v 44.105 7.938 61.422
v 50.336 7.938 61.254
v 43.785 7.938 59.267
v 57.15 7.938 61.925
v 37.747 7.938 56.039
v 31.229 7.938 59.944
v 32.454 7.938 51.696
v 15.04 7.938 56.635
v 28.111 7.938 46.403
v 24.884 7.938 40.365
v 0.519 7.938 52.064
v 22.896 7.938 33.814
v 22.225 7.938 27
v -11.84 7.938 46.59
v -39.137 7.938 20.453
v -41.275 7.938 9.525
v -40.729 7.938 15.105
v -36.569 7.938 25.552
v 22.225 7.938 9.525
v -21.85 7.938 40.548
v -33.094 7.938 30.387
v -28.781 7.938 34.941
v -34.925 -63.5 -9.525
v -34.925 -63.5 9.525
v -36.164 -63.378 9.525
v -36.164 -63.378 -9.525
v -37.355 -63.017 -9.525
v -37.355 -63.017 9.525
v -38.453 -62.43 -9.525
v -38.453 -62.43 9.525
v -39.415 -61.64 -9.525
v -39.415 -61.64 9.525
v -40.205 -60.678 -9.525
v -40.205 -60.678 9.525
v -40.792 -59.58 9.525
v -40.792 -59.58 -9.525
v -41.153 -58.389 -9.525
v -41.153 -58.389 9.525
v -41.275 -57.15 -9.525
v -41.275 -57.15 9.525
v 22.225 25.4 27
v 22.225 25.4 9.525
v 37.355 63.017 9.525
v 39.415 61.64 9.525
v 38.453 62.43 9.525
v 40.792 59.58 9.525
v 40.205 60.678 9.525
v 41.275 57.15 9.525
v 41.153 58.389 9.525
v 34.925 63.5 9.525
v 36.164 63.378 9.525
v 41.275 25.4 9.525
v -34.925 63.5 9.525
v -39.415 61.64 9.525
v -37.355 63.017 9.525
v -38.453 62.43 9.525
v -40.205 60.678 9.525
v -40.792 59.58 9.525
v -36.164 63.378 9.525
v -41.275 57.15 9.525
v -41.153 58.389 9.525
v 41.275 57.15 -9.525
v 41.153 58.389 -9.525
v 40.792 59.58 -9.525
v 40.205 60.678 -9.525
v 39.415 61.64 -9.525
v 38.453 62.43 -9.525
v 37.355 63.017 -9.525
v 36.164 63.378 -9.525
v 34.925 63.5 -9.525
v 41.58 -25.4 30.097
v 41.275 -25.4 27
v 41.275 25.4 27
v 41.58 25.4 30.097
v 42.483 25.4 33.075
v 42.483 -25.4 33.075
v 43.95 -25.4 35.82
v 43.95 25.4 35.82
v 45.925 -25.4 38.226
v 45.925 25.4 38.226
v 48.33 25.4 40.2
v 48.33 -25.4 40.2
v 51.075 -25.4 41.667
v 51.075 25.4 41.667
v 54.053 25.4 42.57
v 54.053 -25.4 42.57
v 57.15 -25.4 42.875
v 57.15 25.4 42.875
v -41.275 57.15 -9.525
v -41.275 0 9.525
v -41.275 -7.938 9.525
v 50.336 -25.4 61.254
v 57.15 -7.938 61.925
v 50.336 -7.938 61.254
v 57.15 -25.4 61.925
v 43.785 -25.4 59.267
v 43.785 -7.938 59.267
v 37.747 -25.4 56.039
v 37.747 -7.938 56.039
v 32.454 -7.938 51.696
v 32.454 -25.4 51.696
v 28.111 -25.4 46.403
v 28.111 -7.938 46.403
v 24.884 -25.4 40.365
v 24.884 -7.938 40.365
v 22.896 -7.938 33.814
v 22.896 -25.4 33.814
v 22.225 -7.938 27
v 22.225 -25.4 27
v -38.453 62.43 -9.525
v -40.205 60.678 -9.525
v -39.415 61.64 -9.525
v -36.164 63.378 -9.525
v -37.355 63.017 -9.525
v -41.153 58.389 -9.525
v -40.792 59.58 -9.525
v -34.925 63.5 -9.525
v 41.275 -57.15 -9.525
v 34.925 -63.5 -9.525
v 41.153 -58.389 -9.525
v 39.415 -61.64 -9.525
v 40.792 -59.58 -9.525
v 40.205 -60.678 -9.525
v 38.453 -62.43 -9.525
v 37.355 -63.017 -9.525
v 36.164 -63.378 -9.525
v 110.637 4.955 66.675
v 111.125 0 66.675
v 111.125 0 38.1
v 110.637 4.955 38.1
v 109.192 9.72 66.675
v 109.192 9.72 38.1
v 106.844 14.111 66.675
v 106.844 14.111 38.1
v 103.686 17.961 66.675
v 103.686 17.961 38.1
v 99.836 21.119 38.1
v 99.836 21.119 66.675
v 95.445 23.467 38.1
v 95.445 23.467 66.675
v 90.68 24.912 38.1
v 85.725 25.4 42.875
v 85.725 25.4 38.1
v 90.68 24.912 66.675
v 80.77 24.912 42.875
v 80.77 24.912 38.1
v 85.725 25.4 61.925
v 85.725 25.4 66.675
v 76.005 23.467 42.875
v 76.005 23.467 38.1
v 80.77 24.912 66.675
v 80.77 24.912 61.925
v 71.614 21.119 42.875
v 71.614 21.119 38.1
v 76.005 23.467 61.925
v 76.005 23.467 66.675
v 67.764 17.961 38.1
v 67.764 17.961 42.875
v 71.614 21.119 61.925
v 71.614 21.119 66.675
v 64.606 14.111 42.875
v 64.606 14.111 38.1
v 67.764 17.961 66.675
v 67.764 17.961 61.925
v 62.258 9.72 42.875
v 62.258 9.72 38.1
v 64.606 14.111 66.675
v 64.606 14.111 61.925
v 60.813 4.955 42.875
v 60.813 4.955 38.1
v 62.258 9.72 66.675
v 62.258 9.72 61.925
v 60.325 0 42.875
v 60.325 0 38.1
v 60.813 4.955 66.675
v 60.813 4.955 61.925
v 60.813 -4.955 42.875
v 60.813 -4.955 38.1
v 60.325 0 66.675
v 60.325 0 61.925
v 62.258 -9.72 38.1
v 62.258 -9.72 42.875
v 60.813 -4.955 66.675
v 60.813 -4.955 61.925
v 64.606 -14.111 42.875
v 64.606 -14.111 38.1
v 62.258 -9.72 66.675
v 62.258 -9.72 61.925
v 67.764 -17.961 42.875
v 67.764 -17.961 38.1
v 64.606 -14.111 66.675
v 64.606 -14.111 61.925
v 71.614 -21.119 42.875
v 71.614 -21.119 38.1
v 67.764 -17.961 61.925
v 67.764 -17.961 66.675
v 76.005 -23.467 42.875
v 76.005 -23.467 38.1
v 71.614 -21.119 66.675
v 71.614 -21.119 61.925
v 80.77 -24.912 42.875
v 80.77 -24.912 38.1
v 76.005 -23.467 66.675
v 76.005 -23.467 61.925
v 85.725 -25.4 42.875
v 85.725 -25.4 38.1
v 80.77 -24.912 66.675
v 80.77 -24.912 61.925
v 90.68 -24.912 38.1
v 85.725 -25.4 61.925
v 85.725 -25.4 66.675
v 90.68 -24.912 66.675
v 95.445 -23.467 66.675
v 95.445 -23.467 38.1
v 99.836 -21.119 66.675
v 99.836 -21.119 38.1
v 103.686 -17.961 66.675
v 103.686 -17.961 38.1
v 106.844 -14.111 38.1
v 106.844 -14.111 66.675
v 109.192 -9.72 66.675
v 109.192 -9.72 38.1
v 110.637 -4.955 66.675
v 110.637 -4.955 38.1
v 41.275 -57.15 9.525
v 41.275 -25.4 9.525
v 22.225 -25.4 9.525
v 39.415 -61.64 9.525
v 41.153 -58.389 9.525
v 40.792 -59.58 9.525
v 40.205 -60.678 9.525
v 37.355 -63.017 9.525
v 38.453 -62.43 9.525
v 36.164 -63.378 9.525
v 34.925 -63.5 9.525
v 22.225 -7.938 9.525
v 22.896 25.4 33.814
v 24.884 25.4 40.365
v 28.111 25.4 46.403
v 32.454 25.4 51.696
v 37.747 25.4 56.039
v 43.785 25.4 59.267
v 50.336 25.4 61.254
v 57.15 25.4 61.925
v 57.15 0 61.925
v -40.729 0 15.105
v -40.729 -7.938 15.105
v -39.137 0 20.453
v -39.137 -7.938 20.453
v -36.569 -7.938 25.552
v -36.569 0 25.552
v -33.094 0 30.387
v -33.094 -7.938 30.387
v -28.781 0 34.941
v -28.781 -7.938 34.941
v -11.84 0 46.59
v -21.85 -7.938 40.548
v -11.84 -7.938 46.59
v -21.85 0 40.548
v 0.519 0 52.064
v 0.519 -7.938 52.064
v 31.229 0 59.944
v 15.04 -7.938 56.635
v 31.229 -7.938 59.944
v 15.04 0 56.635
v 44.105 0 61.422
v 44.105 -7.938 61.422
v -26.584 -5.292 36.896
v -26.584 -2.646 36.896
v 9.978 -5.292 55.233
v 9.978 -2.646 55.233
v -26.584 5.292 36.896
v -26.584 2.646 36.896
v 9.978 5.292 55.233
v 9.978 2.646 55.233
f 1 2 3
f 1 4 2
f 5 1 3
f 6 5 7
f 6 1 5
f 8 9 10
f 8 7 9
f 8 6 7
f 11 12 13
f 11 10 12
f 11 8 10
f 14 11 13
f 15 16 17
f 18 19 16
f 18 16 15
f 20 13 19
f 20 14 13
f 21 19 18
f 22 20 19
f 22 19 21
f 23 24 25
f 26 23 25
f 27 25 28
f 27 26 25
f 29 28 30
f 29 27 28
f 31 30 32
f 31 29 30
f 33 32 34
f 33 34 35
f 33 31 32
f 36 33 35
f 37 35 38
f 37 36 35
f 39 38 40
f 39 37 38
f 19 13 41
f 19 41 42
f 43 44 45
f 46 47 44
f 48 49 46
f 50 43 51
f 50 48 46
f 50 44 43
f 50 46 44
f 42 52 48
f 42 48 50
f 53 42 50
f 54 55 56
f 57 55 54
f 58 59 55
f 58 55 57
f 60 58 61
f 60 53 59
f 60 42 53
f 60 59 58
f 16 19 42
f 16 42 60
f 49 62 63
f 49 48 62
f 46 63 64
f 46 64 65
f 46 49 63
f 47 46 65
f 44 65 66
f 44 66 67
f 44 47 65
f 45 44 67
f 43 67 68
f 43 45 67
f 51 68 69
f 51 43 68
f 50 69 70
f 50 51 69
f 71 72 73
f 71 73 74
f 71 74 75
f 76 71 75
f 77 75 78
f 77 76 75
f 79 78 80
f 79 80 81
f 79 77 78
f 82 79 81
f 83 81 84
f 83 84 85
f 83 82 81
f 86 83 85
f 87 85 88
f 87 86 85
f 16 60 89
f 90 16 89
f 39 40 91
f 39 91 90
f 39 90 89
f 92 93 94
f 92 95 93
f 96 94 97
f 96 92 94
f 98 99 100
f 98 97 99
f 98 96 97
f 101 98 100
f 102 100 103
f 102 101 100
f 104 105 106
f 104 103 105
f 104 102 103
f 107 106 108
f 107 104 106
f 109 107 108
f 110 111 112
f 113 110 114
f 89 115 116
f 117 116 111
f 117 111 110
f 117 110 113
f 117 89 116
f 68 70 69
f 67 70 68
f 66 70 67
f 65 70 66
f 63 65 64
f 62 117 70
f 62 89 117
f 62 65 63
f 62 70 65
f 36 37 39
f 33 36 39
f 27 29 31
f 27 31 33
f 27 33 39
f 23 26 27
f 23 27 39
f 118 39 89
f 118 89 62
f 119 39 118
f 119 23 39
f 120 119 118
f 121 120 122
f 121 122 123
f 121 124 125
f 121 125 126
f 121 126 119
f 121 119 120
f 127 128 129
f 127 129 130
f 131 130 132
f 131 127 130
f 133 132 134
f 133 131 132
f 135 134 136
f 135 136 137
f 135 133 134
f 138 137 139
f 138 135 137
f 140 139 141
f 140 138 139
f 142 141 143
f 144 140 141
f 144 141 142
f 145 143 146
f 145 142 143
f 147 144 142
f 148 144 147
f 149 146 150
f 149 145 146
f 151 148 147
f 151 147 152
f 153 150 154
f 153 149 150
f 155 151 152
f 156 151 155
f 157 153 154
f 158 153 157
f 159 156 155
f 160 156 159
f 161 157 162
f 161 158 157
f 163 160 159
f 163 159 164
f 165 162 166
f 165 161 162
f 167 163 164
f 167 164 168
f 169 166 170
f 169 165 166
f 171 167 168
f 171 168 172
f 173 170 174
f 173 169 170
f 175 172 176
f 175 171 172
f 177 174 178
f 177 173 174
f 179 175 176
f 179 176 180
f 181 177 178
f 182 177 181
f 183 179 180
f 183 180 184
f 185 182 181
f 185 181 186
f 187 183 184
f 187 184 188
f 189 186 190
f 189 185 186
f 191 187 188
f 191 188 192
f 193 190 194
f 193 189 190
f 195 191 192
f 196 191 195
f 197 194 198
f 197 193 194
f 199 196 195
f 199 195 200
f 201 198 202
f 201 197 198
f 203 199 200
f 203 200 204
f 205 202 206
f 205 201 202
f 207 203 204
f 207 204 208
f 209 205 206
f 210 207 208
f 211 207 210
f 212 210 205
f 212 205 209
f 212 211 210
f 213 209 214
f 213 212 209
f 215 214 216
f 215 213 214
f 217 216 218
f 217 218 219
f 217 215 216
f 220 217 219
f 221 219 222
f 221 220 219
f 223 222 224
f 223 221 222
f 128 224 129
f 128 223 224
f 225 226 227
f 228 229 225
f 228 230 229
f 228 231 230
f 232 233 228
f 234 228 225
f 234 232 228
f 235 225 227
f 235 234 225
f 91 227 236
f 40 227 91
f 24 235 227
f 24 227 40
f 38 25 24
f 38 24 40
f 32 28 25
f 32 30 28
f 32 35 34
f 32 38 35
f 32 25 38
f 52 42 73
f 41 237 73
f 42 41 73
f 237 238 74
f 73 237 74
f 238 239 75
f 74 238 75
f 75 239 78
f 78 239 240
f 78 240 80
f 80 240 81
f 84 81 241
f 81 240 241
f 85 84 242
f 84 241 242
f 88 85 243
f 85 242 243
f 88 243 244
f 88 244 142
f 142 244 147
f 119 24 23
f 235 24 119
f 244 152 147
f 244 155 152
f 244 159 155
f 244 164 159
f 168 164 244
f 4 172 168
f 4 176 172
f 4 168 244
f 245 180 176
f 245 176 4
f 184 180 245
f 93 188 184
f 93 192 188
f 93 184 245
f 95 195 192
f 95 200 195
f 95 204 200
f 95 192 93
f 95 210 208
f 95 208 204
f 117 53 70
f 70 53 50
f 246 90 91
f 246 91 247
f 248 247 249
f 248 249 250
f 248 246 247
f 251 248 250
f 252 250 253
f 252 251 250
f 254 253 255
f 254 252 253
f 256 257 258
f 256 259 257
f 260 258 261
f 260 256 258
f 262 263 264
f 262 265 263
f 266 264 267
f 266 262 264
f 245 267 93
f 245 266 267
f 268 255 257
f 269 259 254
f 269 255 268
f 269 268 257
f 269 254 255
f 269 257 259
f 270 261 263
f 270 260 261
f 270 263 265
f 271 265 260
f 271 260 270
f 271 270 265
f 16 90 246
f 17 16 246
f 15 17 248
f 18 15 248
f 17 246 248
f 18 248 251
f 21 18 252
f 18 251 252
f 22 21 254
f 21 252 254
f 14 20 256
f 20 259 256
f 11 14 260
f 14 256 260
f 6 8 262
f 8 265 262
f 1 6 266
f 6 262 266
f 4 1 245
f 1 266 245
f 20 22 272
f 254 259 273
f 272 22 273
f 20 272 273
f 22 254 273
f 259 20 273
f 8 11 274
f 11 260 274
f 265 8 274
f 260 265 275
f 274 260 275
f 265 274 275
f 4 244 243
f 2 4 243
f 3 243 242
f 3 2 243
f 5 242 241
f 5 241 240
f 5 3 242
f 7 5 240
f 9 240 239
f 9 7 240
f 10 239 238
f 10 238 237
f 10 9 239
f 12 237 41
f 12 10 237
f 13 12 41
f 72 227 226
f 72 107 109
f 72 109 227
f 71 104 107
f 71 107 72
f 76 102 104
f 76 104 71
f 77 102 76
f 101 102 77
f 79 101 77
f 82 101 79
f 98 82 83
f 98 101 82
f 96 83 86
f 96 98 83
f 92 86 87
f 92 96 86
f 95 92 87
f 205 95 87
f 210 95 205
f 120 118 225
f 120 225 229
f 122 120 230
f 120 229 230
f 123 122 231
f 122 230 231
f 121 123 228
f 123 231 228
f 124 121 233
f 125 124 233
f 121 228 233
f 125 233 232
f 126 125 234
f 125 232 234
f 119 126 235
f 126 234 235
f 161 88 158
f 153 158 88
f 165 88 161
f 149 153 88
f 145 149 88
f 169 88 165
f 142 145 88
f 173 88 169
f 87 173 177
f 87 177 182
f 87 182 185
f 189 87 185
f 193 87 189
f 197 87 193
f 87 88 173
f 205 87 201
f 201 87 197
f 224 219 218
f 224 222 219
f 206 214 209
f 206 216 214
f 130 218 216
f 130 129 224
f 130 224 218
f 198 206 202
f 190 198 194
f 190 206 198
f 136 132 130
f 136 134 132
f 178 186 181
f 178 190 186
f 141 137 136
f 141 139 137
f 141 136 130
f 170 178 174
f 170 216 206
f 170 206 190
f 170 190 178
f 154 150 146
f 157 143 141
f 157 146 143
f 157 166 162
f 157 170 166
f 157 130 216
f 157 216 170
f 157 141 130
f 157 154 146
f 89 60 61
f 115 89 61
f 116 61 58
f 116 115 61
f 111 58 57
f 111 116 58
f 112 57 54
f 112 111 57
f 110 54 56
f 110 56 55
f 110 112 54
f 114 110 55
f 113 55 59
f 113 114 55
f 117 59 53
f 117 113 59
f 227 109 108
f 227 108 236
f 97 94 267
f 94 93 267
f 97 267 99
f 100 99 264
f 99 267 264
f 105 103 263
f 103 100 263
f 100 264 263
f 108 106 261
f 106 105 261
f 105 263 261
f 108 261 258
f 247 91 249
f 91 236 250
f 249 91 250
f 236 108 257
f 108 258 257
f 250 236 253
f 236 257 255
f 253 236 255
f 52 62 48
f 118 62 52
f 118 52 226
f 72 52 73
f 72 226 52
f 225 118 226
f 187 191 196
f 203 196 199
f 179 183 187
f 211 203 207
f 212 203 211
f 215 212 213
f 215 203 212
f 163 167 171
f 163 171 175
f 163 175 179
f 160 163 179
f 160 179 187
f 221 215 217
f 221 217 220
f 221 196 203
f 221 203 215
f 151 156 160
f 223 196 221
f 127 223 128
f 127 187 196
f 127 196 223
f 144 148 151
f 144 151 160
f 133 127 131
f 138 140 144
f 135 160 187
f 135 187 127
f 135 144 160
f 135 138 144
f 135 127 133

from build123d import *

# Parameters (mm, degrees)
F1_DEPTH = 63.5
F0_W     = 25.4
F0_H     = 19.05
F2_DEPTH = 25.4
F3_DEPTH = 7.9375
F5_R     = 6.35


# Not quite as in the source:
# - a feature names something its author has since deleted; it is built from what else it names


with BuildPart() as f1:
    # F0 (on Front) → F1 (new body, symmetric)
    with BuildSketch(Plane.XZ):
        Polygon((-41.275, 9.525), (-41.275, -9.525), (41.275, -9.525), (41.275, 9.525), (22.225, 9.525), align=None)
    extrude(amount=F1_DEPTH, both=True)

    # F0 (on Front) → F2 (join, symmetric)
    with BuildSketch(Plane.XZ):
        with BuildLine():
            Line((22.225, 9.525), (41.275, 9.525))
            Line((41.275, 9.525), (41.275, 27.0002))
            ThreePointArc((41.275, 27.0002), (45.9246798487, 38.2255201513), (57.15, 42.8752))
            Line((57.15, 42.8752), (60.325, 42.8752))
            Line((60.325, 42.8752), (60.325, 61.9252))
            Line((60.325, 61.9252), (57.15, 61.9252))
            ThreePointArc((57.15, 61.9252), (32.4542956671, 51.6959043329), (22.225, 27.0002))
            Line((22.225, 27.0002), (22.225, 9.525))
        make_face()
        with Locations((73.025, 52.4002)):
            Rectangle(F0_W, F0_H)
    extrude(amount=F2_DEPTH, both=True)

    # F0 (on Front) → F3 (join, symmetric)
    with BuildSketch(Plane.XZ):
        with BuildLine():
            add(Edge.make_bspline(
                [(-41.275, 9.525), (-41.275, 40.5423477454), (8.4285710651, 61.9252), (57.15, 61.9252)],
                knots=[0, 0, 0, 0, 111.5045361635, 111.5045361635, 111.5045361635, 111.5045361635], degree=3))
            Line((-41.275, 9.525), (22.225, 9.525))
            Line((22.225, 9.525), (22.225, 27.0002))
            ThreePointArc((22.225, 27.0002), (32.4542956671, 51.6959043329), (57.15, 61.9252))
        make_face()
    extrude(amount=F3_DEPTH, both=True)

    # F0 (on Front) → F4 (revolve)
    with BuildSketch(Plane.XZ):
        Polygon((85.725, 66.675), (85.725, 61.9252), (85.725, 42.8752), (85.725, 38.1), (111.125, 38.1), (111.125, 66.675), align=None)
    revolve(axis=Axis((85.725, 0, 52.3875), (0, 0, 1)))

    # F5
    f5_edges = [f1.edges().sort_by_distance(p)[0] for p in [
        (41.275, -63.5, 0),
        (-41.275, -63.5, 0),
        (41.275, 63.5, 0),
        (-41.275, 63.5, 0),
    ]]
    fillet(f5_edges, radius=F5_R)


solid = f1.part
